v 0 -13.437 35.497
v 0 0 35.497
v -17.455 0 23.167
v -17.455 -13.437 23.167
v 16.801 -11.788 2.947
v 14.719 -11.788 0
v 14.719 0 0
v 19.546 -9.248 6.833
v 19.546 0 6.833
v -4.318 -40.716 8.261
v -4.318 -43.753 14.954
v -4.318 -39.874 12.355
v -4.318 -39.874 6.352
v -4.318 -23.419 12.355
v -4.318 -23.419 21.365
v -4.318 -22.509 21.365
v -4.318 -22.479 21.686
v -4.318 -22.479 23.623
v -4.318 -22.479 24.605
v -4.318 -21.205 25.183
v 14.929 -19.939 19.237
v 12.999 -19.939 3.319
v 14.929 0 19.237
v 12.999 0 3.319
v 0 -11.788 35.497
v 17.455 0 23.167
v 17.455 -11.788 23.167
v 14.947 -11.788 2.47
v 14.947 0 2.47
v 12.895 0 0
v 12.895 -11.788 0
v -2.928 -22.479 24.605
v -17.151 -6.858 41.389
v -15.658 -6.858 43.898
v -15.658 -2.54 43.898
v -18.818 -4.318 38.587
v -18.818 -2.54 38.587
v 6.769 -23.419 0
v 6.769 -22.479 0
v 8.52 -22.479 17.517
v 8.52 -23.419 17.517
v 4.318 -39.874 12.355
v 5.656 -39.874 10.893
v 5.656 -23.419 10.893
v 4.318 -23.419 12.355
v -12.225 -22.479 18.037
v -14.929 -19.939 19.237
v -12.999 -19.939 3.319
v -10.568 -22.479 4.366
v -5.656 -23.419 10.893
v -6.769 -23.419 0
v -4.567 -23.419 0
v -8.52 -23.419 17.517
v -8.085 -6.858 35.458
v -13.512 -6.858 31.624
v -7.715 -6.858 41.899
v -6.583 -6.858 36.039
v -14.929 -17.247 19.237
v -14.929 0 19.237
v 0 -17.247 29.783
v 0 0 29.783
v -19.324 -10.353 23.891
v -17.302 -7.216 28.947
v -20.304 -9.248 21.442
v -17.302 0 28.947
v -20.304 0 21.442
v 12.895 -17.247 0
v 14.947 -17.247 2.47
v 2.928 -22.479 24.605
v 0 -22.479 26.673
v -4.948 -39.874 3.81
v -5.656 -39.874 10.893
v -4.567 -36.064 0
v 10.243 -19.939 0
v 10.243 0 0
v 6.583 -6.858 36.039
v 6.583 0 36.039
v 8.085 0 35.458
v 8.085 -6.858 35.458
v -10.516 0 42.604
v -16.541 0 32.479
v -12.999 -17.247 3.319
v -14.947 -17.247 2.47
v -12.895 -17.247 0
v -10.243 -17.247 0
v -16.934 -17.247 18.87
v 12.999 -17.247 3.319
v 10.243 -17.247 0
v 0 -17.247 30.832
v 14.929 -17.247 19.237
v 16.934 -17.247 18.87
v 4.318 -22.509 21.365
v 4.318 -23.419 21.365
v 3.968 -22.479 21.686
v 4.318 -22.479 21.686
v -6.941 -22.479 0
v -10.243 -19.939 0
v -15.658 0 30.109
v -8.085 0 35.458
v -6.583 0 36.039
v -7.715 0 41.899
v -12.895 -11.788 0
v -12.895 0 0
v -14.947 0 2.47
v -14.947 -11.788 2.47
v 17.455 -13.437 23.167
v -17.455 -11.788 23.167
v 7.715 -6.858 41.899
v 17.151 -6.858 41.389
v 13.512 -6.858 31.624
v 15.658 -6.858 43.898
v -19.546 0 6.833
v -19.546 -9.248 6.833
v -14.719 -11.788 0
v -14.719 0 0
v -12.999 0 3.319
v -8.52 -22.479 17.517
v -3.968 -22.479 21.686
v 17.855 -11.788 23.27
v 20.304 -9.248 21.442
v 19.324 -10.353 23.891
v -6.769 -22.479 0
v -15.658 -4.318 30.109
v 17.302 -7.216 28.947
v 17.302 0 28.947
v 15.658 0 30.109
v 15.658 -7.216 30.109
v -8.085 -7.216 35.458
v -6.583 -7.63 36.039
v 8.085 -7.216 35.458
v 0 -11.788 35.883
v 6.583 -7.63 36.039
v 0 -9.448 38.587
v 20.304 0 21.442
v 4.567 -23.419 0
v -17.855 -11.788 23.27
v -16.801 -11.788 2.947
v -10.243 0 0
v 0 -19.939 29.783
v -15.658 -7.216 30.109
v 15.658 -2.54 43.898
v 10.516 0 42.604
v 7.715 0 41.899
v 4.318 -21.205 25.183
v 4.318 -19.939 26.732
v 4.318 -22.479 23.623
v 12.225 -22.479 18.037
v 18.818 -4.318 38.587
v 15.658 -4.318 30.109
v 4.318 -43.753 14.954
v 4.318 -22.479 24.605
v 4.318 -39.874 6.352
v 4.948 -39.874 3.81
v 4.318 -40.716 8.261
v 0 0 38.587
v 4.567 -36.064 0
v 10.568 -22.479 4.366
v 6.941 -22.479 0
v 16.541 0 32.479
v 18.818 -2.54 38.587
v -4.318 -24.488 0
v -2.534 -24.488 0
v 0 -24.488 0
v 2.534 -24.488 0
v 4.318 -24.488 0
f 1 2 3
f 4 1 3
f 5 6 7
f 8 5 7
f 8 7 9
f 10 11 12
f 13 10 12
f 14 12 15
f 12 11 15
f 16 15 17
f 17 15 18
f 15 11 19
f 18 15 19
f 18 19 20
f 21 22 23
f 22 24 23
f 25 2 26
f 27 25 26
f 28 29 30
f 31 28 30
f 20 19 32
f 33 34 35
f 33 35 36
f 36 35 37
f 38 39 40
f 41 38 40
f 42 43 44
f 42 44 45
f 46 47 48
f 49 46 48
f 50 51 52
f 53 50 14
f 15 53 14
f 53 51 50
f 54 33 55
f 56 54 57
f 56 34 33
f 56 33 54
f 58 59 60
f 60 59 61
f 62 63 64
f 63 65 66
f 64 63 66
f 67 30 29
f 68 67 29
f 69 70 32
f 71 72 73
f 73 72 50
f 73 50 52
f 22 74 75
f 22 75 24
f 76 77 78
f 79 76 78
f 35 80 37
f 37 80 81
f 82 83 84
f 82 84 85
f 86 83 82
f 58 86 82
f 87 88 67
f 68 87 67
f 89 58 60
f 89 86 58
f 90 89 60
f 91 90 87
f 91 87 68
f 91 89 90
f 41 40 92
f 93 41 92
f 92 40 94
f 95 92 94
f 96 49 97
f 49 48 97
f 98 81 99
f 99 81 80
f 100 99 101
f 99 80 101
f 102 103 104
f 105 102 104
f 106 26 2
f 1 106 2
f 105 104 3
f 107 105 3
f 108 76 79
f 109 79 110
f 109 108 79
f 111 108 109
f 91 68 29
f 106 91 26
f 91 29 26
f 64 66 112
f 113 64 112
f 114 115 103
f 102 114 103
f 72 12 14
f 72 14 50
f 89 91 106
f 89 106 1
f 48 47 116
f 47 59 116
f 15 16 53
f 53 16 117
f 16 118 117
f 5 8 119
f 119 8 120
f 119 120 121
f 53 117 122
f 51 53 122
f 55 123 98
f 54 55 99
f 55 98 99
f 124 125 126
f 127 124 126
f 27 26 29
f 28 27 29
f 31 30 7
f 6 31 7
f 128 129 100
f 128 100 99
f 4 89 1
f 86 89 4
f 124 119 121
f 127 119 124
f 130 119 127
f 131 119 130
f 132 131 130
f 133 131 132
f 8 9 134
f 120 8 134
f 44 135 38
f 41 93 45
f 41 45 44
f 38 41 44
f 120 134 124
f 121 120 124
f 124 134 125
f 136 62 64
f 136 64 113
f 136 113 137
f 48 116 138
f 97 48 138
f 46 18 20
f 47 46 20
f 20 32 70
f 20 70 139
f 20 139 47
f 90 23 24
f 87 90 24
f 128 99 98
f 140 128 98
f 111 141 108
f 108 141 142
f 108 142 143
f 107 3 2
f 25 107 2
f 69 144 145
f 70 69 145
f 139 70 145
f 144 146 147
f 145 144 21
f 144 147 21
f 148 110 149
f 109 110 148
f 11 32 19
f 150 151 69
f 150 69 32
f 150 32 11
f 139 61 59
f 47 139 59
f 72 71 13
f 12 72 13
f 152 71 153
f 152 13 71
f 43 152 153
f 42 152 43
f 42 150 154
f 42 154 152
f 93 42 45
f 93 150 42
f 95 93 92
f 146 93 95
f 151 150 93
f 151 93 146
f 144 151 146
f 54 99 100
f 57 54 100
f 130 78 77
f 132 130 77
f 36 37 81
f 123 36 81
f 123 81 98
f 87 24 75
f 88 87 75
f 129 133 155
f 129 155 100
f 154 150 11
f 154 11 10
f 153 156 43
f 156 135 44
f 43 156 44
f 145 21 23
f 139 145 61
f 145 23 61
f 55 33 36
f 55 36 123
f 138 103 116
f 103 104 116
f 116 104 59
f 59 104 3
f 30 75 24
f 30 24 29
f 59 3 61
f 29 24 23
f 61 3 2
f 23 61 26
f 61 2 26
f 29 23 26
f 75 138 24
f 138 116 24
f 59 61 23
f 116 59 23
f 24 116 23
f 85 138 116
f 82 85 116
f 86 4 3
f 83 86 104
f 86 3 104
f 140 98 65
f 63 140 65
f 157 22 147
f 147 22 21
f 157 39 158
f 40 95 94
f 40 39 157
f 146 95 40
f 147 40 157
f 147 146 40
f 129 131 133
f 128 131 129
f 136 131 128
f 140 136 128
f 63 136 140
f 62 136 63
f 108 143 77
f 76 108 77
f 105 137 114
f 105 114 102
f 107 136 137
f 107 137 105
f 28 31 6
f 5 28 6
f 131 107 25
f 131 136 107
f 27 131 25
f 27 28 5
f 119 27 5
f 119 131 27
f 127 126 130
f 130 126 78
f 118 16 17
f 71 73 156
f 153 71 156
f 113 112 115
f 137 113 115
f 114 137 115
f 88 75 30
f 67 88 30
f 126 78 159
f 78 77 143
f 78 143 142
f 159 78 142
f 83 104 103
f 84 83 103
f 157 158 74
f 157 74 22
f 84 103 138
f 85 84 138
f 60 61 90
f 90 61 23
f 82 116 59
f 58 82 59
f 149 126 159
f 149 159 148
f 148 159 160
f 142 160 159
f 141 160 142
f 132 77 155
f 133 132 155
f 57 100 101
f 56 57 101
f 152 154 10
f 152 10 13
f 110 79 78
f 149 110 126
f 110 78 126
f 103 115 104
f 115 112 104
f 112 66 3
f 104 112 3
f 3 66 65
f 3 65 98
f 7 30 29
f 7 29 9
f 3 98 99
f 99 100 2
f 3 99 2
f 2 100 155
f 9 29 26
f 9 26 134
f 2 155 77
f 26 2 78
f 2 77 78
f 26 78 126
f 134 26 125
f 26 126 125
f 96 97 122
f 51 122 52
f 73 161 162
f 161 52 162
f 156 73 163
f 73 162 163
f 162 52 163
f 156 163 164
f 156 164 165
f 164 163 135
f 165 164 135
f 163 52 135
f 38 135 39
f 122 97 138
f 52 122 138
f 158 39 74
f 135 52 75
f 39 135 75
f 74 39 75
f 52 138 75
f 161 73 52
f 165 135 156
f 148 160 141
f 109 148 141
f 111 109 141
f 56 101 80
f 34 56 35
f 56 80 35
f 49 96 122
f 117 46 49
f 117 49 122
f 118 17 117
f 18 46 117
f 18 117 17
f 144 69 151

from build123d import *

# Parameters (mm, degrees)
F2_DEPTH      = 39.8739650846
F3_DEPTH      = 23.4188
F4_DEPTH      = 2.5338120759
F5_DEPTH      = 2.5338120759
F6_DEPTH      = 4.318
F7_DEPTH      = 4.318
F8_DEPTH      = 4.318
F9_DEPTH      = 4.318
F10_DEPTH     = 22.479
F11_DEPTH     = 6.858
F12_DEPTH     = 6.858
F13_SIZE      = 3.81
F14_DEPTH     = 11.7875300348
F15_T4_DEPTH  = 31.3419967727
F15_T10_DEPTH = 31.3419967727
F15_T16_DEPTH = 31.3419967727
F15_T22_DEPTH = 31.3419967727
F15_T28_DEPTH = 31.3419967727
F15_T34_DEPTH = 31.3419967727
F16_SIZE      = 2.54
F17_T1_DEPTH  = 43.0535401591
F17_T3_DEPTH  = 43.0535401591
F18_SIZE2     = 5.08
F18_SIZE      = 2.54
F19_SIZE2     = 2.54
F19_SIZE      = 5.08
F20_SIZE      = 2.54
F20_2_SIZE    = 2.54
F21_SIZE      = 2.54
F22_SIZE      = 2.54
F23_DEPTH     = 17.2466
F24_SIZE      = 3.81


# Not quite as in the source:
# - a fillet or chamfer that OpenCascade refuses, or shapes differently, is made with other operations: its cross-section is extruded or revolved along the edge and cut away or added


with BuildPart() as f2:
    # F0 (on Front) → F2 (new body, through all)
    with BuildSketch(Plane.XZ):
        Polygon((-5.6564622056, 10.8933445899), (-4.5672636413, 0), (4.5672636413, 0), (5.6564622056, 10.8933445899), (2.5338120759, 14.3030425534), (0, 14.3030425534), (-2.5338120759, 14.3030425534), align=None)
    extrude(amount=F2_DEPTH)

    # F0 (on Front) → F3 (join)
    with BuildSketch(Plane.XZ):
        Polygon((2.5338120759, 22.999221459), (0, 22.999221459), (-2.5338120759, 22.999221459), (-8.5202902555, 17.5167191774), (-6.7688368594, 0), (-4.5672636413, 0), (-5.6564622056, 10.8933445899), (-2.5338120759, 14.3030425534), (0, 14.3030425534), (2.5338120759, 14.3030425534), (5.6564622056, 10.8933445899), (4.5672636413, 0), (6.7688368594, 0), (8.5202902555, 17.5167191774), align=None)
    extrude(amount=F3_DEPTH)

    # F1 (on Right) → F4 (join, through all)
    with BuildSketch(Plane.YZ):
        Polygon((-24.4880802929, 0), (-22.7810184772, 18.4260877826), (-39.8739650846, 13.7478467077), (-40.7163016498, 8.2610081881), (-37.5194847584, 1.0165241547), align=None)
    extrude(amount=F4_DEPTH)

    # F1 (on Right) → F5 (join, through all)
    with BuildSketch(Plane.YZ):
        Polygon((-24.4880802929, 0), (-22.7810184772, 18.4260877826), (-39.8739650846, 13.7478467077), (-40.7163016498, 8.2610081881), (-37.5194847584, 1.0165241547), align=None)
    extrude(amount=-F5_DEPTH)

    # F1 (on Right) → F6 (join)
    with BuildSketch(Plane.YZ):
        Polygon((-22.7810184772, 18.4260877826), (-22.196745819, 24.7327482608), (-43.7525391617, 14.9538140945), (-40.7163016498, 8.2610081881), (-39.8739650846, 13.7478467077), align=None)
    extrude(amount=F6_DEPTH)

    # F1 (on Right) → F7 (join)
    with BuildSketch(Plane.YZ):
        Polygon((-22.7810184772, 18.4260877826), (-22.196745819, 24.7327482608), (-43.7525391617, 14.9538140945), (-40.7163016498, 8.2610081881), (-39.8739650846, 13.7478467077), align=None)
    extrude(amount=-F7_DEPTH)

    # F1 (on Right) → F8 (join)
    with BuildSketch(Plane.YZ):
        Polygon((-24.4880802929, 0), (-22.7810184772, 18.4260877826), (-39.8739650846, 13.7478467077), (-40.7163016498, 8.2610081881), (-37.5194847584, 1.0165241547), align=None)
    extrude(amount=F8_DEPTH)

    # F1 (on Right) → F9 (join)
    with BuildSketch(Plane.YZ):
        Polygon((-24.4880802929, 0), (-22.7810184772, 18.4260877826), (-39.8739650846, 13.7478467077), (-40.7163016498, 8.2610081881), (-37.5194847584, 1.0165241547), align=None)
    extrude(amount=-F9_DEPTH)

    # F0 (on Front) → F10 (join)
    with BuildSketch(Plane.XZ):
        Polygon((-2.5338120759, 22.999221459), (0, 22.999221459), (2.5338120759, 22.999221459), (8.5202902555, 17.5167191774), (6.7688368594, 0), (10.2427834645, 0), (12.9992077127, 3.318562638), (14.928705059, 19.2369148135), (0, 29.7826942206), (-14.928705059, 19.2369148135), (-12.9992077127, 3.318562638), (-10.2427834645, 0), (-6.7688368594, 0), (-8.5202902555, 17.5167191774), align=None)
    extrude(amount=F10_DEPTH)

    # F13
    f13_edges = [f2.edges().sort_by_distance(p)[0] for p in [
        (0, -39.873965, 0),
    ]]
    chamfer(f13_edges, length=F13_SIZE)

    # F15: chamfer of 2.54 on 2 edges, made by hand


with BuildPart() as f11:
    # F0 (on Front) → F11 (new body)
    with BuildSketch(Plane.XZ):
        Polygon((-18.8178192778, 38.5874472558), (-15.6579893082, 30.1085207639), (-8.0853653706, 35.4578944211), (-6.5828679126, 36.0394569064), (-7.71546131, 41.899394244), (-15.6579893082, 43.8978375339), align=None)
    extrude(amount=F11_DEPTH)

    # F18
    f18_edges = [f11.edges().sort_by_distance(p)[0] for p in [
        (-17.237904, 0, 41.242642),
    ]]
    f18_side = f11.faces().sort_by_distance((-17.237904, -3.429, 41.242642))[0]
    chamfer(f18_edges, length=F18_SIZE, length2=F18_SIZE2, reference=f18_side)

    # F20
    f20_edges = [f11.edges().sort_by_distance(p)[0] for p in [
        (-17.237904, -6.858, 34.347984),
    ]]
    chamfer(f20_edges, length=F20_SIZE)


with BuildPart() as f12:
    # F0 (on Front) → F12 (new body)
    with BuildSketch(Plane.XZ):
        Polygon((8.0853653706, 35.4578944211), (15.6579893082, 30.1085207639), (18.8178192778, 38.5874472558), (15.6579893082, 43.8978375339), (7.71546131, 41.899394244), (6.5828679126, 36.0394569064), align=None)
    extrude(amount=F12_DEPTH)

    # F19
    f19_edges = [f12.edges().sort_by_distance(p)[0] for p in [
        (17.237904, 0, 41.242642),
    ]]
    f19_side = f12.faces().sort_by_distance((12.965594, 0, 37.738789))[0]
    chamfer(f19_edges, length=F19_SIZE, length2=F19_SIZE2, reference=f19_side)

    # F20#2
    f20_2_edges = [f12.edges().sort_by_distance(p)[0] for p in [
        (17.237904, -6.858, 34.347984),
    ]]
    chamfer(f20_2_edges, length=F20_2_SIZE)


with BuildPart() as f14:
    # F0 (on Front) → F14 (new body, through all)
    with BuildSketch(Plane.XZ):
        Polygon((-14.7188181917, 0), (-12.8946364057, 0), (-14.9466200506, 2.4704601485), (-17.4552400274, 23.1665737461), (0, 35.4971215129), (17.4552400274, 23.1665737461), (14.9466200506, 2.4704601485), (12.8946364057, 0), (14.7188181917, 0), (19.5457171649, 6.8330038339), (20.3037317842, 21.4420538396), (17.3015593183, 28.9474872584), (15.6579893082, 30.1085207639), (8.0853653706, 35.4578944211), (6.5828679126, 36.0394569064), (0, 38.5874472558), (-6.5828679126, 36.0394569064), (-8.0853653706, 35.4578944211), (-15.6579893082, 30.1085207639), (-17.3015593183, 28.9474872584), (-20.3037317842, 21.4420538396), (-19.5457171649, 6.8330038339), align=None)
    extrude(amount=F14_DEPTH)

    # F17: chamfer of 4.318 x 4.572 on 2 edges, made by hand

    # F17_s2 → F17_t1 (cut)
    with BuildSketch(Plane(origin=(-7.5110021569, 0, -5.3058434446), x_dir=(0, 1, 0), z_dir=(0.816764956, 0, 0.5769705423))):
        Polygon((-11.7875300348, 29.307783219), (-7.2155300348, 33.625783219), (-11.7875300348, 33.625783219), align=None)
    extrude(amount=F17_T1_DEPTH, mode=Mode.SUBTRACT)

    # F17_s4 → F17_t3 (cut)
    with BuildSketch(Plane(origin=(-27.6536206766, 0, 19.534780968), x_dir=(0, 1, 0), z_dir=(0.816764956, 0, -0.5769705423))):
        Polygon((-11.7875300348, 29.307783219), (-7.2155300348, 33.625783219), (-11.7875300348, 33.625783219), align=None)
    extrude(amount=F17_T3_DEPTH, mode=Mode.SUBTRACT)

    # F21
    f21_edges = [f14.edges().sort_by_distance(p)[0] for p in [
        (-19.924724, -11.78753, 14.137529),
        (19.924724, -11.78753, 14.137529),
    ]]
    chamfer(f21_edges, length=F21_SIZE)


with BuildPart() as f15_tool2:
    # F15_s3 → F15_t4 (new body)
    with BuildSketch(Plane(origin=(19.3702441645, 0, 13.6833249243), x_dir=(0, 1, 0), z_dir=(-0.816764956, 0, -0.5769705423))):
        Polygon((-22.479, -21.7854609346), (-19.939, -24.3254609346), (-22.479, -24.3254609346), align=None)
    extrude(amount=F15_T4_DEPTH)

    split(bisect_by=Plane(origin=(0, -13.0936420454, 28.8624340069), x_dir=(1, 0, 0), z_dir=(0, -0.4131322018, 0.9106710624)), keep=Keep.TOP)

    split(bisect_by=Plane.YZ.offset(-4.318), keep=Keep.TOP)


with BuildPart() as f2_1:
    add(f2.part)

    # F15_t1: cut F15_tool2
    add(f15_tool2.part, mode=Mode.SUBTRACT)


with BuildPart() as f15_tool8:
    # F15_s9 → F15_t10 (new body)
    with BuildSketch(Plane(origin=(19.3702441645, 0, 13.6833249243), x_dir=(0, 1, 0), z_dir=(-0.816764956, 0, -0.5769705423))):
        Polygon((-22.479, -21.7854609346), (-19.939, -24.3254609346), (-22.479, -24.3254609346), align=None)
    extrude(amount=F15_T10_DEPTH)

    split(bisect_by=Plane(origin=(0, -13.0936420454, 28.8624340069), x_dir=(1, 0, 0), z_dir=(0, -0.4131322018, 0.9106710624)), keep=Keep.TOP)

    split(bisect_by=Plane.YZ.offset(-4.318), keep=Keep.BOTTOM)


with BuildPart() as f2_2:
    add(f2_1.part)

    # F15_t7: cut F15_tool8
    add(f15_tool8.part, mode=Mode.SUBTRACT)


with BuildPart() as f15_tool14:
    # F15_s15 → F15_t16 (new body)
    with BuildSketch(Plane(origin=(19.3702441645, 0, 13.6833249243), x_dir=(0, 1, 0), z_dir=(-0.816764956, 0, -0.5769705423))):
        Polygon((-22.479, -21.7854609346), (-19.939, -24.3254609346), (-22.479, -24.3254609346), align=None)
    extrude(amount=F15_T16_DEPTH)

    split(bisect_by=Plane(origin=(0, -13.0936420454, 28.8624340069), x_dir=(1, 0, 0), z_dir=(0, 0.4131322018, -0.9106710624)), keep=Keep.TOP)

    split(bisect_by=Plane.YZ.offset(-4.318), keep=Keep.BOTTOM)


with BuildPart() as f2_3:
    add(f2_2.part)

    # F15_t13: cut F15_tool14
    add(f15_tool14.part, mode=Mode.SUBTRACT)


with BuildPart() as f15_tool20:
    # F15_s21 → F15_t22 (new body)
    with BuildSketch(Plane(origin=(6.2288004504, 0, -4.4000839497), x_dir=(0, 1, 0), z_dir=(-0.816764956, 0, 0.5769705423))):
        Polygon((-22.479, -21.7854609346), (-19.939, -24.3254609346), (-22.479, -24.3254609346), align=None)
    extrude(amount=F15_T22_DEPTH)

    split(bisect_by=Plane.YZ.offset(4.318), keep=Keep.TOP)

    split(bisect_by=Plane(origin=(0, -13.0936420454, 28.8624340069), x_dir=(1, 0, 0), z_dir=(0, 0.4131322018, -0.9106710624)), keep=Keep.TOP)


with BuildPart() as f2_4:
    add(f2_3.part)

    # F15_t19: cut F15_tool20
    add(f15_tool20.part, mode=Mode.SUBTRACT)


with BuildPart() as f15_tool26:
    # F15_s27 → F15_t28 (new body)
    with BuildSketch(Plane(origin=(6.2288004504, 0, -4.4000839497), x_dir=(0, 1, 0), z_dir=(-0.816764956, 0, 0.5769705423))):
        Polygon((-22.479, -21.7854609346), (-19.939, -24.3254609346), (-22.479, -24.3254609346), align=None)
    extrude(amount=F15_T28_DEPTH)

    split(bisect_by=Plane.YZ.offset(4.318), keep=Keep.TOP)

    split(bisect_by=Plane(origin=(0, -13.0936420454, 28.8624340069), x_dir=(1, 0, 0), z_dir=(0, -0.4131322018, 0.9106710624)), keep=Keep.TOP)


with BuildPart() as f2_5:
    add(f2_4.part)

    # F15_t25: cut F15_tool26
    add(f15_tool26.part, mode=Mode.SUBTRACT)


with BuildPart() as f15_tool32:
    # F15_s33 → F15_t34 (new body)
    with BuildSketch(Plane(origin=(6.2288004504, 0, -4.4000839497), x_dir=(0, 1, 0), z_dir=(-0.816764956, 0, 0.5769705423))):
        Polygon((-22.479, -21.7854609346), (-19.939, -24.3254609346), (-22.479, -24.3254609346), align=None)
    extrude(amount=F15_T34_DEPTH)

    split(bisect_by=Plane.YZ.offset(4.318), keep=Keep.BOTTOM)

    split(bisect_by=Plane(origin=(0, -13.0936420454, 28.8624340069), x_dir=(1, 0, 0), z_dir=(0, -0.4131322018, 0.9106710624)), keep=Keep.TOP)


with BuildPart() as f2_6:
    add(f2_5.part)

    # F15_t31: cut F15_tool32
    add(f15_tool32.part, mode=Mode.SUBTRACT)

    # F16
    f16_edges = [f2_6.edges().sort_by_distance(p)[0] for p in [
        (-11.620996, -22.479, 1.659281),
        (11.620996, -22.479, 1.659281),
    ]]
    chamfer(f16_edges, length=F16_SIZE)

    # F22
    f22_edges = [f2_6.edges().sort_by_distance(p)[0] for p in [
        (-14.072441, -22.479, 12.172733),
        (14.072441, -22.479, 12.172733),
    ]]
    chamfer(f22_edges, length=F22_SIZE)


with BuildPart() as f23:
    # F0 (on Front) → F23 (new body)
    with BuildSketch(Plane.XZ):
        Polygon((-12.8946364057, 0), (-10.2427834645, 0), (-12.9992077127, 3.318562638), (-14.928705059, 19.2369148135), (0, 29.7826942206), (14.928705059, 19.2369148135), (12.9992077127, 3.318562638), (10.2427834645, 0), (12.8946364057, 0), (14.9466200506, 2.4704601485), (17.4552400274, 23.1665737461), (0, 35.4971215129), (-17.4552400274, 23.1665737461), (-14.9466200506, 2.4704601485), align=None)
    extrude(amount=F23_DEPTH)

    # F24
    f24_edges = [f23.edges().sort_by_distance(p)[0] for p in [
        (-8.72762, -17.2466, 29.331848),
        (8.72762, -17.2466, 29.331848),
    ]]
    chamfer(f24_edges, length=F24_SIZE)


solid = Compound([f11.part, f12.part, f14.part, f2_6.part, f23.part])
